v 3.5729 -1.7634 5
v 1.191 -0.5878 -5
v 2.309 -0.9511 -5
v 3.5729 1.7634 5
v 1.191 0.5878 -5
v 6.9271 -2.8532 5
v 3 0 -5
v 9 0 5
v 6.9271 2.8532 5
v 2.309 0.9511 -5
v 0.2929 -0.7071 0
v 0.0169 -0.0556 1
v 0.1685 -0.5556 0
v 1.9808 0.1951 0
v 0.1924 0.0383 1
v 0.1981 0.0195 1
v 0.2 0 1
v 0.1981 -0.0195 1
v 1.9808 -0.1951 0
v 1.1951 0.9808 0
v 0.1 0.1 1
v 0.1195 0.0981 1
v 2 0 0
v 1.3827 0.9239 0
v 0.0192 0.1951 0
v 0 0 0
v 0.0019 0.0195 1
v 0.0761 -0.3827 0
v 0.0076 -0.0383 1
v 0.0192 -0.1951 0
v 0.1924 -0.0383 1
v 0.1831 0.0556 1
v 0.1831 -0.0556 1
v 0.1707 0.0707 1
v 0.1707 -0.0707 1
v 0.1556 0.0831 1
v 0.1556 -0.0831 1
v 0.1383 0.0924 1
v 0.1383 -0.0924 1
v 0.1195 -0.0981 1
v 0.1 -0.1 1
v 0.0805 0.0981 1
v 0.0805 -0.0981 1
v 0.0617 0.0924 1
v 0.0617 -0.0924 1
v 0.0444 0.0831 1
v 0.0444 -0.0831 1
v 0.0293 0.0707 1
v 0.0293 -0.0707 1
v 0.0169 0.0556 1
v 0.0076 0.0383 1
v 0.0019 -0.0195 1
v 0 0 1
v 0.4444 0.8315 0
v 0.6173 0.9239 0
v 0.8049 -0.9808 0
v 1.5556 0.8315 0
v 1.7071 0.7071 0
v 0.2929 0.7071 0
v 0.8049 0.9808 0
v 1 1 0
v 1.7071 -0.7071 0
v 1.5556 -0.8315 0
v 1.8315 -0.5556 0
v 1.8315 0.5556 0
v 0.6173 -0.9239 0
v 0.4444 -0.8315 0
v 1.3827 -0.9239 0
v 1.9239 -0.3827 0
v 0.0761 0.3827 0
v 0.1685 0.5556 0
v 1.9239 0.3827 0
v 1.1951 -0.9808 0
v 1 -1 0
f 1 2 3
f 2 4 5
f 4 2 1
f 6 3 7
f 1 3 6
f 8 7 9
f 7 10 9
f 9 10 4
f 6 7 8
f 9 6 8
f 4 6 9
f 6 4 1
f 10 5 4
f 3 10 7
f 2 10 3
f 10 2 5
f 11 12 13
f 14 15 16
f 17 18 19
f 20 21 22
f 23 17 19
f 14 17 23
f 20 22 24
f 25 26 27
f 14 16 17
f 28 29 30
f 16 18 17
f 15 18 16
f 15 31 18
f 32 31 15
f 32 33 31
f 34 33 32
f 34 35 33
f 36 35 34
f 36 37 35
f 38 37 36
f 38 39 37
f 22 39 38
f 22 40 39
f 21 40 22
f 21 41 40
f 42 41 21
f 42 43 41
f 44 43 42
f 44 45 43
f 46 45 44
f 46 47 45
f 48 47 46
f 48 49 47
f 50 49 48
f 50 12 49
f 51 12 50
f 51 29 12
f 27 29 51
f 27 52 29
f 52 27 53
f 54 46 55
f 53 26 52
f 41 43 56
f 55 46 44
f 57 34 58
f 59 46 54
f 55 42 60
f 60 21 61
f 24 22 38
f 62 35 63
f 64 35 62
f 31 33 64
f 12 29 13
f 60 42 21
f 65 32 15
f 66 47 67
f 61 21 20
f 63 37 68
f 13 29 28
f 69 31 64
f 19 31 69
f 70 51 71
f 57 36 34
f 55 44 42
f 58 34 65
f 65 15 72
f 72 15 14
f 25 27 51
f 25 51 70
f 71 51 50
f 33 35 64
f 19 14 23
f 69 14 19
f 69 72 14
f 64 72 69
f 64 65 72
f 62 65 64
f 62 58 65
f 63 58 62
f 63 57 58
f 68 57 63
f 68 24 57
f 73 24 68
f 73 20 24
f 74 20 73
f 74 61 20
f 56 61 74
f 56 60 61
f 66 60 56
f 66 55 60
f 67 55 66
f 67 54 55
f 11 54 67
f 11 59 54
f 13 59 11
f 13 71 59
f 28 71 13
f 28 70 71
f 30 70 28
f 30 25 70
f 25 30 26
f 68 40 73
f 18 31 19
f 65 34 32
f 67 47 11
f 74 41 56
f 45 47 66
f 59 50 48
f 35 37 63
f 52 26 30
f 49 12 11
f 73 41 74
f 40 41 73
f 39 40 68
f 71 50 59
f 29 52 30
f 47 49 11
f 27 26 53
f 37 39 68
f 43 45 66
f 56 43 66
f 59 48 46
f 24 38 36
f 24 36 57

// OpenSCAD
//  linear_extrude(height = 10, center = true, convexity = 10, scale=[1,5], $fn=100)
//  translate([2, 0, 0])
//  circle(r = 1);


  linear_extrude(height = 10, center = true, convexity = 10, scale=3)
 translate([2, 0, 0])
 circle(r = 1);


  linear_extrude(height=1, scale=[0.1,0.1])
   translate([1,0,0]) circle(r=1, $fn=32);
